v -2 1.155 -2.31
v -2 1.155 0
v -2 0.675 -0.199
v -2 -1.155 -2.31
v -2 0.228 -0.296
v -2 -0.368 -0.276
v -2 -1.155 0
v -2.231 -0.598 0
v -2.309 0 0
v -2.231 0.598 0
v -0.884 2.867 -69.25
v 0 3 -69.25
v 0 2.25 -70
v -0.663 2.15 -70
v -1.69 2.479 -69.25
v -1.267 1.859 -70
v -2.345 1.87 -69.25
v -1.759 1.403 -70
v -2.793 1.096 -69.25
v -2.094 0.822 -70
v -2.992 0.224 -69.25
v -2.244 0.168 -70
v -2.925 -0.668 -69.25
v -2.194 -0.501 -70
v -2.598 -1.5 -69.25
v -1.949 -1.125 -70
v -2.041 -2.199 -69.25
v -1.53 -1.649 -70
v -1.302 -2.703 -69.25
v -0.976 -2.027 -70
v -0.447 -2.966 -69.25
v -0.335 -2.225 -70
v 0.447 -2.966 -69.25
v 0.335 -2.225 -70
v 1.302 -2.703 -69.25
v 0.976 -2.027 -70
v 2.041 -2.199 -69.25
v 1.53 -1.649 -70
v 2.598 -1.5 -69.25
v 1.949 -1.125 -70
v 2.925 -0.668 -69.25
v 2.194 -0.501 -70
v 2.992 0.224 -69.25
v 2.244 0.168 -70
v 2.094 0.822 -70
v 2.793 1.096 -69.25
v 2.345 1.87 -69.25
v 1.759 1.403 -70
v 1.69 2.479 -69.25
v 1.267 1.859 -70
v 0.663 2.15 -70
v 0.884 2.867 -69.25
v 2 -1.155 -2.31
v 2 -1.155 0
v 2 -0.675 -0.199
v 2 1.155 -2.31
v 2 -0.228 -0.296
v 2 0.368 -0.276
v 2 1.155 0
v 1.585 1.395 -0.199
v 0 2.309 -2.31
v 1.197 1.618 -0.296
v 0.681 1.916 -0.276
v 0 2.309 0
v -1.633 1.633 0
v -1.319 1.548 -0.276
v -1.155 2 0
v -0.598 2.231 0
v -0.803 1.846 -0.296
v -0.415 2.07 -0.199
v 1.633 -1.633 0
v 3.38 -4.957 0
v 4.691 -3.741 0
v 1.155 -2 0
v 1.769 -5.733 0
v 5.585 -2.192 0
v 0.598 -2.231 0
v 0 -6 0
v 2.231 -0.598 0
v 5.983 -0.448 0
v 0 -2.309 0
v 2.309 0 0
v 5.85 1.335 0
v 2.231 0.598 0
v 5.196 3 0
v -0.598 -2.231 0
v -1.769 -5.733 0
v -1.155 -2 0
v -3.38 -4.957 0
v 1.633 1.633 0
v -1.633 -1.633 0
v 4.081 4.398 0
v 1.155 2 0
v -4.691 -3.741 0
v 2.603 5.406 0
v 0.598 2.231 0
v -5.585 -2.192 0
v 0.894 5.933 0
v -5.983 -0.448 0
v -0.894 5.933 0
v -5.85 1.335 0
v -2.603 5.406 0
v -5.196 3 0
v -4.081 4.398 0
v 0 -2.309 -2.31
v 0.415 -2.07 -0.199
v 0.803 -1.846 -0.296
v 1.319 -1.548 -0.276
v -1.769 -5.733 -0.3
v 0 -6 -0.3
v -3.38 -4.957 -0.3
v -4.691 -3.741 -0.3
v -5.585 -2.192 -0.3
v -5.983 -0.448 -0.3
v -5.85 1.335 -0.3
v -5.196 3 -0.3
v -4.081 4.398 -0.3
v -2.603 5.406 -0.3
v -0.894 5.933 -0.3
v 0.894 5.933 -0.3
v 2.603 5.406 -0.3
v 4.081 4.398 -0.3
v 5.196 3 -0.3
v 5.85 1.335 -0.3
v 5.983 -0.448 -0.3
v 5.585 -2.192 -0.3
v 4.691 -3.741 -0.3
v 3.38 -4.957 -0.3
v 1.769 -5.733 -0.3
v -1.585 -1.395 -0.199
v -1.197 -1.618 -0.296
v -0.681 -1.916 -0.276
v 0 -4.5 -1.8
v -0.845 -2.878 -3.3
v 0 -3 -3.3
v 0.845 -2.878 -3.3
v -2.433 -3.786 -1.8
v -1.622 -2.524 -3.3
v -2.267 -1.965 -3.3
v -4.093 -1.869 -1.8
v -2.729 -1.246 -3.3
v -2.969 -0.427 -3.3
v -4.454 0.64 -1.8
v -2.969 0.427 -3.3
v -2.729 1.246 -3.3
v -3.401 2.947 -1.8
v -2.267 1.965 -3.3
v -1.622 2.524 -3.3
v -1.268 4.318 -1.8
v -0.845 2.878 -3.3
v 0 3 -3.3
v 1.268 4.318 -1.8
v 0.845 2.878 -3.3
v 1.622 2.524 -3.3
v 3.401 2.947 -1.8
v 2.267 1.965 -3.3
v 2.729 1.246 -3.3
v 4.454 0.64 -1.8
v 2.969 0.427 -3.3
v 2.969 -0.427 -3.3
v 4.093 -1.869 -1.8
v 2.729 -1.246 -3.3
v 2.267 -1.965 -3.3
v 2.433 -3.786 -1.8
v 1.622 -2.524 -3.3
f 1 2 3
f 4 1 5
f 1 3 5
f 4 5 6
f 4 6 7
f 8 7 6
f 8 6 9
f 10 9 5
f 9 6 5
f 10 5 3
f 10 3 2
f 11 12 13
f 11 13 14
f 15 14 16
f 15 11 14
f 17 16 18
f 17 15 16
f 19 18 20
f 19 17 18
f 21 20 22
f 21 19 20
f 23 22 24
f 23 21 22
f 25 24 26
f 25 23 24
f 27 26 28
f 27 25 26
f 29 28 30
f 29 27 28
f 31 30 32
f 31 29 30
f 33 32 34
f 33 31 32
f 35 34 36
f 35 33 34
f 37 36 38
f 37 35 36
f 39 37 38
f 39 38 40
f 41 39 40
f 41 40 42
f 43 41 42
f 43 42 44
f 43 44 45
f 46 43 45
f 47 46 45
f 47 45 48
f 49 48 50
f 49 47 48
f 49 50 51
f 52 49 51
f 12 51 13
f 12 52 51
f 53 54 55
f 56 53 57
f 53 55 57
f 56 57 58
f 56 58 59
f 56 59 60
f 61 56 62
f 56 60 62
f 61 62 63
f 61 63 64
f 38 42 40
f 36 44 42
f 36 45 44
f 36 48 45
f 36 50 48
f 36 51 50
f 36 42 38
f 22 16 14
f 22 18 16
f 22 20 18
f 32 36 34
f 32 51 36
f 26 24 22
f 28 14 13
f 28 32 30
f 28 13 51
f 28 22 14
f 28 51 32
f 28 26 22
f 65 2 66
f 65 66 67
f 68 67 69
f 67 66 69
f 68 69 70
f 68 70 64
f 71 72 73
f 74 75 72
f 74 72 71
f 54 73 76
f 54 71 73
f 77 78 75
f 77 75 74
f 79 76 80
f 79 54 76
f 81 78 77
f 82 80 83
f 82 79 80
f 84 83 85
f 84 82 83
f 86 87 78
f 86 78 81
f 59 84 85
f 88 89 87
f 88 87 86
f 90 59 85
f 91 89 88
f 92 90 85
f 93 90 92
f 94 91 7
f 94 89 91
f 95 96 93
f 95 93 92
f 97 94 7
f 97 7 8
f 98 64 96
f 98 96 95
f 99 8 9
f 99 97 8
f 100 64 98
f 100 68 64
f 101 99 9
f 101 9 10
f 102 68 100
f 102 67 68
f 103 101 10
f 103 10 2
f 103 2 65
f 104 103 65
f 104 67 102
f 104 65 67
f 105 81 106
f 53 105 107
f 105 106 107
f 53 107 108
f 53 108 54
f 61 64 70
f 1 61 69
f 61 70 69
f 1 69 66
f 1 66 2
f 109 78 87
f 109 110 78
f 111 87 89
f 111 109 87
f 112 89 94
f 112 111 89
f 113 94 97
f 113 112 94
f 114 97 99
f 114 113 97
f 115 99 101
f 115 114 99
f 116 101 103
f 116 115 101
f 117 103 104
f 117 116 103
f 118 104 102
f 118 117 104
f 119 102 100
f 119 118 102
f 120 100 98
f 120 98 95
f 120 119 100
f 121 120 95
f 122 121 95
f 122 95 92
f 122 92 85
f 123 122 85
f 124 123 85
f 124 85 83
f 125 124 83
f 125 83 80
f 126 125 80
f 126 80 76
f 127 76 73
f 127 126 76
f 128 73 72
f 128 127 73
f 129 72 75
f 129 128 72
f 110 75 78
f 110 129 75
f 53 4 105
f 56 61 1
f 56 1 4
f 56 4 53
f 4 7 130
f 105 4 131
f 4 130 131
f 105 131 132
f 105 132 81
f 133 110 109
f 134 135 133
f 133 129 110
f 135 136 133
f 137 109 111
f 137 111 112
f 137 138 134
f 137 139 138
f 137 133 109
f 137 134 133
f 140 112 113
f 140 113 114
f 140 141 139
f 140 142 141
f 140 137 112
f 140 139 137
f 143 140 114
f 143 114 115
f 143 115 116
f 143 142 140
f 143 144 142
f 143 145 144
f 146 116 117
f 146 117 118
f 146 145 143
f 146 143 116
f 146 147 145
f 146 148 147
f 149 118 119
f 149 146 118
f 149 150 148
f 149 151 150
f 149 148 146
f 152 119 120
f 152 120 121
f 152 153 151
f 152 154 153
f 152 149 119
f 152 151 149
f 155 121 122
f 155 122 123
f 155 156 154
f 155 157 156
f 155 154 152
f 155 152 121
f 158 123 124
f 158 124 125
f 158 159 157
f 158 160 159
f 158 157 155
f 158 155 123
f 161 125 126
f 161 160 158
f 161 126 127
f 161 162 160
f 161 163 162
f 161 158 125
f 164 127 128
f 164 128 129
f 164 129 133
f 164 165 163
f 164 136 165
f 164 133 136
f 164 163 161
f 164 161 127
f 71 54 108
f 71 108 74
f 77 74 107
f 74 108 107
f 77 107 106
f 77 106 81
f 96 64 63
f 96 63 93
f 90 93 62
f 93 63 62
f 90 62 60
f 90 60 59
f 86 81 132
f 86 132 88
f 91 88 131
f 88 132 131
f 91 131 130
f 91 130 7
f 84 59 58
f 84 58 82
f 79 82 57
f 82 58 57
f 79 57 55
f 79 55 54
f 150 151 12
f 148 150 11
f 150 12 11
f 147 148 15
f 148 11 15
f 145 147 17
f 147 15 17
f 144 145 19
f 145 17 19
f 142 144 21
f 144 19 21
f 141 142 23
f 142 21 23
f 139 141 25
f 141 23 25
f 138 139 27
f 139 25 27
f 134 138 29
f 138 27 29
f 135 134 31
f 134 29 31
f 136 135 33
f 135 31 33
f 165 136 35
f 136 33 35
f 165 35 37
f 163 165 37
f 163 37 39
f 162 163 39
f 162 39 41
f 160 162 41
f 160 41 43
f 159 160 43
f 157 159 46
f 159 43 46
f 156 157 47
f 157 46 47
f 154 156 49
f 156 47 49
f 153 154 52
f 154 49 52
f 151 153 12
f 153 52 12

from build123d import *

# Parameters (mm, degrees)
SKETCH1_W          = 70
SKETCH1_H          = 3
CHAMFER1_SIZE      = 0.75
CUT_EXTRUDE2_DEPTH = 2.31


with BuildPart() as part:
    # Sketch1 → Revolve1 (revolve)
    with BuildSketch(Plane(origin=(0, 0, 0), x_dir=(0, 0, -1), z_dir=(1, 0, 0))):
        with Locations((35, 1.5)):
            Rectangle(SKETCH1_W, SKETCH1_H)
    revolve(axis=Axis((0, 0, -70), (0, 0, 1)))

    # Chamfer1
    chamfer1_edges = [part.edges().sort_by_distance(p)[0] for p in [
        (0, -3, -70),
    ]]
    chamfer(chamfer1_edges, length=CHAMFER1_SIZE)

    # Sketch7 → Revolve2 (revolve)
    with BuildSketch(Plane(origin=(0, 0, 0), x_dir=(0, 0, -1), z_dir=(1, 0, 0)), mode=Mode.PRIVATE) as revolve2_sk:
        Polygon((0, 6), (0.3, 6), (3.3, 3), (3.3, 0), (0, 0), align=None)
    revolve(revolve2_sk.sketch.rotate(Axis((0, 0, 0), (0, 0, -1)), 180), axis=Axis((0, 0, 0), (0, 0, -1)))

    # Boss-Extrude1 cone 1 section (through the dimple's axis) → Boss-Extrude1 (revolve)
    with BuildSketch(Plane(origin=(0, 0, -3.3), x_dir=(0, -1, 0), z_dir=(1, 0, 0))):
        Polygon((0, 0), (3, 0), (0, 3), align=None)
    revolve(axis=Axis((0, 0, -3.3), (0, 0, -1)))

    # Sketch5 → Cut-Extrude2 (cut)
    with BuildSketch(Plane.XY):
        Polygon((2, -1.154700538), (2, 1.154700538), (0, 2.309401077), (-2, 1.154700538), (-2, -1.154700538), (0, -2.309401077), align=None)
    extrude(amount=-CUT_EXTRUDE2_DEPTH, mode=Mode.SUBTRACT)

    # Cut-Extrude3 cone 1 section (through the dimple's axis) → Cut-Extrude3 (revolve, cut)
    with BuildSketch(Plane(origin=(0, 0, 0), x_dir=(0, -1, 0), z_dir=(1, 0, 0))):
        Polygon((0, 0), (2.309401077, 0), (0, 2.309401077), align=None)
    revolve(axis=Axis((0, 0, 0), (0, 0, -1)), mode=Mode.SUBTRACT)


solid = part.part
